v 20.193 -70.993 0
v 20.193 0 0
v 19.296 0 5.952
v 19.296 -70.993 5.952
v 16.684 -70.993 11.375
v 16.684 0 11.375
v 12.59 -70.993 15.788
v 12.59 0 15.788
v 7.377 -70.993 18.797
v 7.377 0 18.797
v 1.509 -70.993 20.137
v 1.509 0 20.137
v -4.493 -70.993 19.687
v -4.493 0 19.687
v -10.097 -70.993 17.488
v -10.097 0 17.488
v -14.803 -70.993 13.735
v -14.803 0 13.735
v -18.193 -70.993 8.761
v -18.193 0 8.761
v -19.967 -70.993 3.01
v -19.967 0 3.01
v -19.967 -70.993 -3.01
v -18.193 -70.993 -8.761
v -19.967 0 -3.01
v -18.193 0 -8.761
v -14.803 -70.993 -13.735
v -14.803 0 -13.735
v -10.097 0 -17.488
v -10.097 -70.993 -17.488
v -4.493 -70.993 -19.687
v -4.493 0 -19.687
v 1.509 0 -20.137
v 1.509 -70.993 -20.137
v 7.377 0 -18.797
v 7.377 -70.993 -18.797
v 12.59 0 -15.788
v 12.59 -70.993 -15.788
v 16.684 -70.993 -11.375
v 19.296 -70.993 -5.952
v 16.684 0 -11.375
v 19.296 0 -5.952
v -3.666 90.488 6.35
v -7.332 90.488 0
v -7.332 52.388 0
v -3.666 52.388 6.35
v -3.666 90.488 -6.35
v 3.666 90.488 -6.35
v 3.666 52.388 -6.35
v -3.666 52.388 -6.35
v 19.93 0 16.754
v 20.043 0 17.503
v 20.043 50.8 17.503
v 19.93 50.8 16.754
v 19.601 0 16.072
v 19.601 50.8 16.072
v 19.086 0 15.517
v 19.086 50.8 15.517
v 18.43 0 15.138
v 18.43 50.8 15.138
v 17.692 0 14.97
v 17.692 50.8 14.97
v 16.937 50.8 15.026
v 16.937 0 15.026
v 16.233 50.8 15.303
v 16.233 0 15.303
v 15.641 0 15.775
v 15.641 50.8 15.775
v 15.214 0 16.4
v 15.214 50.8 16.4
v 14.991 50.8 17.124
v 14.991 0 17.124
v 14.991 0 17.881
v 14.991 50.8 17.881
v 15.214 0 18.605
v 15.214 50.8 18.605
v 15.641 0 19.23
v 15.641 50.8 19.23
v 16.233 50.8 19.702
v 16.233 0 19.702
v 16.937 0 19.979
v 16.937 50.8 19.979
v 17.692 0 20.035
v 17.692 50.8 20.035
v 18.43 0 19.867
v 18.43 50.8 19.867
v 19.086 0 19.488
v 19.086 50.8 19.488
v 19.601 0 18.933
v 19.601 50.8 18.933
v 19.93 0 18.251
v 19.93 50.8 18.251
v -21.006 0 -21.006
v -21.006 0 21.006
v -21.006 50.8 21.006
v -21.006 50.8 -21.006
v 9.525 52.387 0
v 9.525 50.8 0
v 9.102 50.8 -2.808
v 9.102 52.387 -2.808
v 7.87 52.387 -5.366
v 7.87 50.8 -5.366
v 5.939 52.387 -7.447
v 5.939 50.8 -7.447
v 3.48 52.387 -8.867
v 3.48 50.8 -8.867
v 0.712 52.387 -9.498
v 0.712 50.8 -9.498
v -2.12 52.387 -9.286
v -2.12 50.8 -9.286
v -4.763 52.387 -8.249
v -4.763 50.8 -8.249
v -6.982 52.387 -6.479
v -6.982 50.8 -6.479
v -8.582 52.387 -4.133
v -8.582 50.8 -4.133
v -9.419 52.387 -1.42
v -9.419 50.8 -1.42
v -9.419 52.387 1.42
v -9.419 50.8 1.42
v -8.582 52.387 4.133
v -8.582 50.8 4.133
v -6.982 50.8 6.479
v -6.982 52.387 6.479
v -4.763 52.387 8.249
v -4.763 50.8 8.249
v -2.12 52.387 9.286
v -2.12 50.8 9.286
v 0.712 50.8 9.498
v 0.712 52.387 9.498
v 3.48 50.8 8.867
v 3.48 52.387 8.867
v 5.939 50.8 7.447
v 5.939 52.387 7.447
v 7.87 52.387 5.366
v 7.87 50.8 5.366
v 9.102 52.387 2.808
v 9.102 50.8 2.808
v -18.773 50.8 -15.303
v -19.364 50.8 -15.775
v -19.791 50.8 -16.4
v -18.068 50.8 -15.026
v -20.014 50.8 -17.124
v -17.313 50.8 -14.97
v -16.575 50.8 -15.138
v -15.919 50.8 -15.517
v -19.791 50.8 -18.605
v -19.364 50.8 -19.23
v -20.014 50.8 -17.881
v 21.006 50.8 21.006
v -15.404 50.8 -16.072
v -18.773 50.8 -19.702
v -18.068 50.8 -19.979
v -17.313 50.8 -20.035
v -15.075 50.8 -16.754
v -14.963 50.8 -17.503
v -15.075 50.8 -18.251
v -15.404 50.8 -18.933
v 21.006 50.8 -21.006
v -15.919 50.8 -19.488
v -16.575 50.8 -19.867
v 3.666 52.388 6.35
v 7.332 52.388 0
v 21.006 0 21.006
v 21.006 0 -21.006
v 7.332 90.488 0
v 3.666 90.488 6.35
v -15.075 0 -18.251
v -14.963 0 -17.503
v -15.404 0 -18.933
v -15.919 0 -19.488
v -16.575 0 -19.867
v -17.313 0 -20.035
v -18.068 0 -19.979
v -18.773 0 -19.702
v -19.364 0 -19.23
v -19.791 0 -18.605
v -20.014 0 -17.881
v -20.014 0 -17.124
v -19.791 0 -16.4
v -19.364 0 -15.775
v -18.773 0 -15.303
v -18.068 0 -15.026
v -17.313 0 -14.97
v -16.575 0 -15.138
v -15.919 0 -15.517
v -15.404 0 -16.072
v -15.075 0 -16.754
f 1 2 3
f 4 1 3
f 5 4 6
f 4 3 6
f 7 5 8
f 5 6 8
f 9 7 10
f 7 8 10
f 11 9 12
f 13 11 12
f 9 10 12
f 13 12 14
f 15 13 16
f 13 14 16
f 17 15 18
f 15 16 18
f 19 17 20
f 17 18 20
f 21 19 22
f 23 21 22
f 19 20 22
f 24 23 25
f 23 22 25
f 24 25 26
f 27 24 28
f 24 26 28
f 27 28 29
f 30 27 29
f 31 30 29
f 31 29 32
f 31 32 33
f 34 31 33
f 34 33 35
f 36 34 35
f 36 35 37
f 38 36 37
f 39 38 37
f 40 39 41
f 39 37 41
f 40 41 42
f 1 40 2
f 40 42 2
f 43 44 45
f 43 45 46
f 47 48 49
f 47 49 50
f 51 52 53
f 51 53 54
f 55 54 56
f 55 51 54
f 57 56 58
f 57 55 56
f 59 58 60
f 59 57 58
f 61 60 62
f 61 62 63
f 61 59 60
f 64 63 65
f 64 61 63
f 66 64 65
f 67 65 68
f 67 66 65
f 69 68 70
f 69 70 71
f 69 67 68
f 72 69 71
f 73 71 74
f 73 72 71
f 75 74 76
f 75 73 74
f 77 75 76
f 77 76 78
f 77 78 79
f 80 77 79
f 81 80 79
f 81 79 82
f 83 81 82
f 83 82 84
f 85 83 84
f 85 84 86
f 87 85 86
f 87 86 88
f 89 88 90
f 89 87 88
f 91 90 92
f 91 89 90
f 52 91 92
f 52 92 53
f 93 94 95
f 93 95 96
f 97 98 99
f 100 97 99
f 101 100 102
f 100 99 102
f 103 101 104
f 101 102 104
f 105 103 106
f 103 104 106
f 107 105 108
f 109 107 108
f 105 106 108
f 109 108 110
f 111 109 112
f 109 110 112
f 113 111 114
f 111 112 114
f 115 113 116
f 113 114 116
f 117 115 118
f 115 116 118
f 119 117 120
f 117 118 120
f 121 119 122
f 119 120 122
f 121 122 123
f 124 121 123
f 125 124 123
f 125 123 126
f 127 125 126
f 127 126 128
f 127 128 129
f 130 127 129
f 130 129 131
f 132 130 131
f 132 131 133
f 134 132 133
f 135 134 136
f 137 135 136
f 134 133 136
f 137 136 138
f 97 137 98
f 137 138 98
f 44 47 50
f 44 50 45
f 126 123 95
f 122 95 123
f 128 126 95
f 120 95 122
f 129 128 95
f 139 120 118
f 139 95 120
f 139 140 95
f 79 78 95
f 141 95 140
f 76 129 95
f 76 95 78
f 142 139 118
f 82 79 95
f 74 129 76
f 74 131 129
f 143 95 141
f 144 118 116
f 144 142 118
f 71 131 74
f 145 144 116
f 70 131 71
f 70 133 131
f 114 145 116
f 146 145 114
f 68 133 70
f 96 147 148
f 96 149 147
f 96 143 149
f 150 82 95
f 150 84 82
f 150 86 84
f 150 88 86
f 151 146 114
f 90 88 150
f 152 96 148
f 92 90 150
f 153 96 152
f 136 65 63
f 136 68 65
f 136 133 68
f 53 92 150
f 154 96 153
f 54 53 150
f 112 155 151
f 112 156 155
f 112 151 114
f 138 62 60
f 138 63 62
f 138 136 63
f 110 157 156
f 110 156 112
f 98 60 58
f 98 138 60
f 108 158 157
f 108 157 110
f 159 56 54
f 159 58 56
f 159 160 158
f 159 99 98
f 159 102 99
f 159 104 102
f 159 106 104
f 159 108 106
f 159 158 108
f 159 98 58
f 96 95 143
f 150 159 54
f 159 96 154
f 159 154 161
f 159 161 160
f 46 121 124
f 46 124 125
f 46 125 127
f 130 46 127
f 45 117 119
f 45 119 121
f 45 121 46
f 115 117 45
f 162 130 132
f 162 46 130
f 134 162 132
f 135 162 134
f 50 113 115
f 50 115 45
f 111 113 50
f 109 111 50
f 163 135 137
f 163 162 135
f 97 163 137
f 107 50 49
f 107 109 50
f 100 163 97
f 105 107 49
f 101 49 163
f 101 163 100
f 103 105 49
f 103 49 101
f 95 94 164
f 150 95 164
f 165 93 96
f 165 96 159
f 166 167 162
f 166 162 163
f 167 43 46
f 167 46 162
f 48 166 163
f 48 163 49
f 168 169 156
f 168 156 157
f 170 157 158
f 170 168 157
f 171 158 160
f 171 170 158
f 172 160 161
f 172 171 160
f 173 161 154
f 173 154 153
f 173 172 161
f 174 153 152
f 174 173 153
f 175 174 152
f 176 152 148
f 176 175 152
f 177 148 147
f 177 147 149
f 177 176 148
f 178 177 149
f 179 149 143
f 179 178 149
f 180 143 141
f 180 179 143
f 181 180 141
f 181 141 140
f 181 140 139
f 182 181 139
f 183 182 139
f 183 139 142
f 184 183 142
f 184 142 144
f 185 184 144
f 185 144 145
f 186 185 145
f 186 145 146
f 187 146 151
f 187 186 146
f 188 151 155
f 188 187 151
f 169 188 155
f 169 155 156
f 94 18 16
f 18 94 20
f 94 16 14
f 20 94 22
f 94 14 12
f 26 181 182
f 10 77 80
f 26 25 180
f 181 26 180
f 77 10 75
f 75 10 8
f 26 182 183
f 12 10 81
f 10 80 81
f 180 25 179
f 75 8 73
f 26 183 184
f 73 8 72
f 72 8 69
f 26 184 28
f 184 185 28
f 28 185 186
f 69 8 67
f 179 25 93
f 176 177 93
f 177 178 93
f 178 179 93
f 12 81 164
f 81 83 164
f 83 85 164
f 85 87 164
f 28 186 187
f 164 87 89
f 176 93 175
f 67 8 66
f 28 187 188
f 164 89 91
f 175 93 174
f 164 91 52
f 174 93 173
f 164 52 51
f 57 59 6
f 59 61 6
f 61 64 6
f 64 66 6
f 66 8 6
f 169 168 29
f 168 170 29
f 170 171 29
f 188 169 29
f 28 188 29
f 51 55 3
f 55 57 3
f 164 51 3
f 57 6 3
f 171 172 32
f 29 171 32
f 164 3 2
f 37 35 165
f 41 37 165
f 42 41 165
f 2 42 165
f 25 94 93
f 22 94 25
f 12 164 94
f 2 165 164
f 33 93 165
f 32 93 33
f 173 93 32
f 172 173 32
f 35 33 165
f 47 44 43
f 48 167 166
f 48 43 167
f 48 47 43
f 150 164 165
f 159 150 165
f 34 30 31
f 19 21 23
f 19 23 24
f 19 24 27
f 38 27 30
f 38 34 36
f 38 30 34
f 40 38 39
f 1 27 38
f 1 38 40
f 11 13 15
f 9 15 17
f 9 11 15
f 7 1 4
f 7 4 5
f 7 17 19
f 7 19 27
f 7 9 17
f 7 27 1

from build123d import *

# Parameters (mm, degrees)
SKETCH1_W           = 42.0116
SKETCH1_H           = 42.0116
SKETCH1_R           = 2.54
BOSS_EXTRUDE1_DEPTH = 50.8
SKETCH2_R           = 9.525
BOSS_EXTRUDE2_DEPTH = 1.5875
BOSS_EXTRUDE3_DEPTH = 38.1
SKETCH4_R           = 20.193
BOSS_EXTRUDE4_DEPTH = 70.993


with BuildPart() as part:
    # Sketch1 → Boss-Extrude1 (new body)
    with BuildSketch(Plane(origin=(0, 0, 0), x_dir=(1, 0, 0), z_dir=(0, 1, 0))):
        Rectangle(SKETCH1_W, SKETCH1_H)
        with Locations((-17.50251918, 17.50251918)):
            Circle(SKETCH1_R, mode=Mode.SUBTRACT)
        with Locations((17.50251918, -17.50251918)):
            Circle(SKETCH1_R, mode=Mode.SUBTRACT)
    extrude(amount=BOSS_EXTRUDE1_DEPTH)

    # Sketch2 → Boss-Extrude2 (add)
    with BuildSketch(Plane(origin=(0, 50.8, 0), x_dir=(1, 0, 0), z_dir=(0, 1, 0))):
        Circle(SKETCH2_R)
    extrude(amount=BOSS_EXTRUDE2_DEPTH)

    # Sketch3 → Boss-Extrude3 (add)
    with BuildSketch(Plane(origin=(0, 52.3875, 0), x_dir=(1, 0, 0), z_dir=(0, 1, 0))):
        Polygon((3.666174209, -6.35), (7.332348419, 0), (3.666174209, 6.35), (-3.666174209, 6.35), (-7.332348419, 0), (-3.666174209, -6.35), align=None)
    extrude(amount=BOSS_EXTRUDE3_DEPTH)

    # Sketch4 → Boss-Extrude4 (add)
    with BuildSketch(Plane.XZ):
        Circle(SKETCH4_R)
    extrude(amount=BOSS_EXTRUDE4_DEPTH)


solid = part.part
